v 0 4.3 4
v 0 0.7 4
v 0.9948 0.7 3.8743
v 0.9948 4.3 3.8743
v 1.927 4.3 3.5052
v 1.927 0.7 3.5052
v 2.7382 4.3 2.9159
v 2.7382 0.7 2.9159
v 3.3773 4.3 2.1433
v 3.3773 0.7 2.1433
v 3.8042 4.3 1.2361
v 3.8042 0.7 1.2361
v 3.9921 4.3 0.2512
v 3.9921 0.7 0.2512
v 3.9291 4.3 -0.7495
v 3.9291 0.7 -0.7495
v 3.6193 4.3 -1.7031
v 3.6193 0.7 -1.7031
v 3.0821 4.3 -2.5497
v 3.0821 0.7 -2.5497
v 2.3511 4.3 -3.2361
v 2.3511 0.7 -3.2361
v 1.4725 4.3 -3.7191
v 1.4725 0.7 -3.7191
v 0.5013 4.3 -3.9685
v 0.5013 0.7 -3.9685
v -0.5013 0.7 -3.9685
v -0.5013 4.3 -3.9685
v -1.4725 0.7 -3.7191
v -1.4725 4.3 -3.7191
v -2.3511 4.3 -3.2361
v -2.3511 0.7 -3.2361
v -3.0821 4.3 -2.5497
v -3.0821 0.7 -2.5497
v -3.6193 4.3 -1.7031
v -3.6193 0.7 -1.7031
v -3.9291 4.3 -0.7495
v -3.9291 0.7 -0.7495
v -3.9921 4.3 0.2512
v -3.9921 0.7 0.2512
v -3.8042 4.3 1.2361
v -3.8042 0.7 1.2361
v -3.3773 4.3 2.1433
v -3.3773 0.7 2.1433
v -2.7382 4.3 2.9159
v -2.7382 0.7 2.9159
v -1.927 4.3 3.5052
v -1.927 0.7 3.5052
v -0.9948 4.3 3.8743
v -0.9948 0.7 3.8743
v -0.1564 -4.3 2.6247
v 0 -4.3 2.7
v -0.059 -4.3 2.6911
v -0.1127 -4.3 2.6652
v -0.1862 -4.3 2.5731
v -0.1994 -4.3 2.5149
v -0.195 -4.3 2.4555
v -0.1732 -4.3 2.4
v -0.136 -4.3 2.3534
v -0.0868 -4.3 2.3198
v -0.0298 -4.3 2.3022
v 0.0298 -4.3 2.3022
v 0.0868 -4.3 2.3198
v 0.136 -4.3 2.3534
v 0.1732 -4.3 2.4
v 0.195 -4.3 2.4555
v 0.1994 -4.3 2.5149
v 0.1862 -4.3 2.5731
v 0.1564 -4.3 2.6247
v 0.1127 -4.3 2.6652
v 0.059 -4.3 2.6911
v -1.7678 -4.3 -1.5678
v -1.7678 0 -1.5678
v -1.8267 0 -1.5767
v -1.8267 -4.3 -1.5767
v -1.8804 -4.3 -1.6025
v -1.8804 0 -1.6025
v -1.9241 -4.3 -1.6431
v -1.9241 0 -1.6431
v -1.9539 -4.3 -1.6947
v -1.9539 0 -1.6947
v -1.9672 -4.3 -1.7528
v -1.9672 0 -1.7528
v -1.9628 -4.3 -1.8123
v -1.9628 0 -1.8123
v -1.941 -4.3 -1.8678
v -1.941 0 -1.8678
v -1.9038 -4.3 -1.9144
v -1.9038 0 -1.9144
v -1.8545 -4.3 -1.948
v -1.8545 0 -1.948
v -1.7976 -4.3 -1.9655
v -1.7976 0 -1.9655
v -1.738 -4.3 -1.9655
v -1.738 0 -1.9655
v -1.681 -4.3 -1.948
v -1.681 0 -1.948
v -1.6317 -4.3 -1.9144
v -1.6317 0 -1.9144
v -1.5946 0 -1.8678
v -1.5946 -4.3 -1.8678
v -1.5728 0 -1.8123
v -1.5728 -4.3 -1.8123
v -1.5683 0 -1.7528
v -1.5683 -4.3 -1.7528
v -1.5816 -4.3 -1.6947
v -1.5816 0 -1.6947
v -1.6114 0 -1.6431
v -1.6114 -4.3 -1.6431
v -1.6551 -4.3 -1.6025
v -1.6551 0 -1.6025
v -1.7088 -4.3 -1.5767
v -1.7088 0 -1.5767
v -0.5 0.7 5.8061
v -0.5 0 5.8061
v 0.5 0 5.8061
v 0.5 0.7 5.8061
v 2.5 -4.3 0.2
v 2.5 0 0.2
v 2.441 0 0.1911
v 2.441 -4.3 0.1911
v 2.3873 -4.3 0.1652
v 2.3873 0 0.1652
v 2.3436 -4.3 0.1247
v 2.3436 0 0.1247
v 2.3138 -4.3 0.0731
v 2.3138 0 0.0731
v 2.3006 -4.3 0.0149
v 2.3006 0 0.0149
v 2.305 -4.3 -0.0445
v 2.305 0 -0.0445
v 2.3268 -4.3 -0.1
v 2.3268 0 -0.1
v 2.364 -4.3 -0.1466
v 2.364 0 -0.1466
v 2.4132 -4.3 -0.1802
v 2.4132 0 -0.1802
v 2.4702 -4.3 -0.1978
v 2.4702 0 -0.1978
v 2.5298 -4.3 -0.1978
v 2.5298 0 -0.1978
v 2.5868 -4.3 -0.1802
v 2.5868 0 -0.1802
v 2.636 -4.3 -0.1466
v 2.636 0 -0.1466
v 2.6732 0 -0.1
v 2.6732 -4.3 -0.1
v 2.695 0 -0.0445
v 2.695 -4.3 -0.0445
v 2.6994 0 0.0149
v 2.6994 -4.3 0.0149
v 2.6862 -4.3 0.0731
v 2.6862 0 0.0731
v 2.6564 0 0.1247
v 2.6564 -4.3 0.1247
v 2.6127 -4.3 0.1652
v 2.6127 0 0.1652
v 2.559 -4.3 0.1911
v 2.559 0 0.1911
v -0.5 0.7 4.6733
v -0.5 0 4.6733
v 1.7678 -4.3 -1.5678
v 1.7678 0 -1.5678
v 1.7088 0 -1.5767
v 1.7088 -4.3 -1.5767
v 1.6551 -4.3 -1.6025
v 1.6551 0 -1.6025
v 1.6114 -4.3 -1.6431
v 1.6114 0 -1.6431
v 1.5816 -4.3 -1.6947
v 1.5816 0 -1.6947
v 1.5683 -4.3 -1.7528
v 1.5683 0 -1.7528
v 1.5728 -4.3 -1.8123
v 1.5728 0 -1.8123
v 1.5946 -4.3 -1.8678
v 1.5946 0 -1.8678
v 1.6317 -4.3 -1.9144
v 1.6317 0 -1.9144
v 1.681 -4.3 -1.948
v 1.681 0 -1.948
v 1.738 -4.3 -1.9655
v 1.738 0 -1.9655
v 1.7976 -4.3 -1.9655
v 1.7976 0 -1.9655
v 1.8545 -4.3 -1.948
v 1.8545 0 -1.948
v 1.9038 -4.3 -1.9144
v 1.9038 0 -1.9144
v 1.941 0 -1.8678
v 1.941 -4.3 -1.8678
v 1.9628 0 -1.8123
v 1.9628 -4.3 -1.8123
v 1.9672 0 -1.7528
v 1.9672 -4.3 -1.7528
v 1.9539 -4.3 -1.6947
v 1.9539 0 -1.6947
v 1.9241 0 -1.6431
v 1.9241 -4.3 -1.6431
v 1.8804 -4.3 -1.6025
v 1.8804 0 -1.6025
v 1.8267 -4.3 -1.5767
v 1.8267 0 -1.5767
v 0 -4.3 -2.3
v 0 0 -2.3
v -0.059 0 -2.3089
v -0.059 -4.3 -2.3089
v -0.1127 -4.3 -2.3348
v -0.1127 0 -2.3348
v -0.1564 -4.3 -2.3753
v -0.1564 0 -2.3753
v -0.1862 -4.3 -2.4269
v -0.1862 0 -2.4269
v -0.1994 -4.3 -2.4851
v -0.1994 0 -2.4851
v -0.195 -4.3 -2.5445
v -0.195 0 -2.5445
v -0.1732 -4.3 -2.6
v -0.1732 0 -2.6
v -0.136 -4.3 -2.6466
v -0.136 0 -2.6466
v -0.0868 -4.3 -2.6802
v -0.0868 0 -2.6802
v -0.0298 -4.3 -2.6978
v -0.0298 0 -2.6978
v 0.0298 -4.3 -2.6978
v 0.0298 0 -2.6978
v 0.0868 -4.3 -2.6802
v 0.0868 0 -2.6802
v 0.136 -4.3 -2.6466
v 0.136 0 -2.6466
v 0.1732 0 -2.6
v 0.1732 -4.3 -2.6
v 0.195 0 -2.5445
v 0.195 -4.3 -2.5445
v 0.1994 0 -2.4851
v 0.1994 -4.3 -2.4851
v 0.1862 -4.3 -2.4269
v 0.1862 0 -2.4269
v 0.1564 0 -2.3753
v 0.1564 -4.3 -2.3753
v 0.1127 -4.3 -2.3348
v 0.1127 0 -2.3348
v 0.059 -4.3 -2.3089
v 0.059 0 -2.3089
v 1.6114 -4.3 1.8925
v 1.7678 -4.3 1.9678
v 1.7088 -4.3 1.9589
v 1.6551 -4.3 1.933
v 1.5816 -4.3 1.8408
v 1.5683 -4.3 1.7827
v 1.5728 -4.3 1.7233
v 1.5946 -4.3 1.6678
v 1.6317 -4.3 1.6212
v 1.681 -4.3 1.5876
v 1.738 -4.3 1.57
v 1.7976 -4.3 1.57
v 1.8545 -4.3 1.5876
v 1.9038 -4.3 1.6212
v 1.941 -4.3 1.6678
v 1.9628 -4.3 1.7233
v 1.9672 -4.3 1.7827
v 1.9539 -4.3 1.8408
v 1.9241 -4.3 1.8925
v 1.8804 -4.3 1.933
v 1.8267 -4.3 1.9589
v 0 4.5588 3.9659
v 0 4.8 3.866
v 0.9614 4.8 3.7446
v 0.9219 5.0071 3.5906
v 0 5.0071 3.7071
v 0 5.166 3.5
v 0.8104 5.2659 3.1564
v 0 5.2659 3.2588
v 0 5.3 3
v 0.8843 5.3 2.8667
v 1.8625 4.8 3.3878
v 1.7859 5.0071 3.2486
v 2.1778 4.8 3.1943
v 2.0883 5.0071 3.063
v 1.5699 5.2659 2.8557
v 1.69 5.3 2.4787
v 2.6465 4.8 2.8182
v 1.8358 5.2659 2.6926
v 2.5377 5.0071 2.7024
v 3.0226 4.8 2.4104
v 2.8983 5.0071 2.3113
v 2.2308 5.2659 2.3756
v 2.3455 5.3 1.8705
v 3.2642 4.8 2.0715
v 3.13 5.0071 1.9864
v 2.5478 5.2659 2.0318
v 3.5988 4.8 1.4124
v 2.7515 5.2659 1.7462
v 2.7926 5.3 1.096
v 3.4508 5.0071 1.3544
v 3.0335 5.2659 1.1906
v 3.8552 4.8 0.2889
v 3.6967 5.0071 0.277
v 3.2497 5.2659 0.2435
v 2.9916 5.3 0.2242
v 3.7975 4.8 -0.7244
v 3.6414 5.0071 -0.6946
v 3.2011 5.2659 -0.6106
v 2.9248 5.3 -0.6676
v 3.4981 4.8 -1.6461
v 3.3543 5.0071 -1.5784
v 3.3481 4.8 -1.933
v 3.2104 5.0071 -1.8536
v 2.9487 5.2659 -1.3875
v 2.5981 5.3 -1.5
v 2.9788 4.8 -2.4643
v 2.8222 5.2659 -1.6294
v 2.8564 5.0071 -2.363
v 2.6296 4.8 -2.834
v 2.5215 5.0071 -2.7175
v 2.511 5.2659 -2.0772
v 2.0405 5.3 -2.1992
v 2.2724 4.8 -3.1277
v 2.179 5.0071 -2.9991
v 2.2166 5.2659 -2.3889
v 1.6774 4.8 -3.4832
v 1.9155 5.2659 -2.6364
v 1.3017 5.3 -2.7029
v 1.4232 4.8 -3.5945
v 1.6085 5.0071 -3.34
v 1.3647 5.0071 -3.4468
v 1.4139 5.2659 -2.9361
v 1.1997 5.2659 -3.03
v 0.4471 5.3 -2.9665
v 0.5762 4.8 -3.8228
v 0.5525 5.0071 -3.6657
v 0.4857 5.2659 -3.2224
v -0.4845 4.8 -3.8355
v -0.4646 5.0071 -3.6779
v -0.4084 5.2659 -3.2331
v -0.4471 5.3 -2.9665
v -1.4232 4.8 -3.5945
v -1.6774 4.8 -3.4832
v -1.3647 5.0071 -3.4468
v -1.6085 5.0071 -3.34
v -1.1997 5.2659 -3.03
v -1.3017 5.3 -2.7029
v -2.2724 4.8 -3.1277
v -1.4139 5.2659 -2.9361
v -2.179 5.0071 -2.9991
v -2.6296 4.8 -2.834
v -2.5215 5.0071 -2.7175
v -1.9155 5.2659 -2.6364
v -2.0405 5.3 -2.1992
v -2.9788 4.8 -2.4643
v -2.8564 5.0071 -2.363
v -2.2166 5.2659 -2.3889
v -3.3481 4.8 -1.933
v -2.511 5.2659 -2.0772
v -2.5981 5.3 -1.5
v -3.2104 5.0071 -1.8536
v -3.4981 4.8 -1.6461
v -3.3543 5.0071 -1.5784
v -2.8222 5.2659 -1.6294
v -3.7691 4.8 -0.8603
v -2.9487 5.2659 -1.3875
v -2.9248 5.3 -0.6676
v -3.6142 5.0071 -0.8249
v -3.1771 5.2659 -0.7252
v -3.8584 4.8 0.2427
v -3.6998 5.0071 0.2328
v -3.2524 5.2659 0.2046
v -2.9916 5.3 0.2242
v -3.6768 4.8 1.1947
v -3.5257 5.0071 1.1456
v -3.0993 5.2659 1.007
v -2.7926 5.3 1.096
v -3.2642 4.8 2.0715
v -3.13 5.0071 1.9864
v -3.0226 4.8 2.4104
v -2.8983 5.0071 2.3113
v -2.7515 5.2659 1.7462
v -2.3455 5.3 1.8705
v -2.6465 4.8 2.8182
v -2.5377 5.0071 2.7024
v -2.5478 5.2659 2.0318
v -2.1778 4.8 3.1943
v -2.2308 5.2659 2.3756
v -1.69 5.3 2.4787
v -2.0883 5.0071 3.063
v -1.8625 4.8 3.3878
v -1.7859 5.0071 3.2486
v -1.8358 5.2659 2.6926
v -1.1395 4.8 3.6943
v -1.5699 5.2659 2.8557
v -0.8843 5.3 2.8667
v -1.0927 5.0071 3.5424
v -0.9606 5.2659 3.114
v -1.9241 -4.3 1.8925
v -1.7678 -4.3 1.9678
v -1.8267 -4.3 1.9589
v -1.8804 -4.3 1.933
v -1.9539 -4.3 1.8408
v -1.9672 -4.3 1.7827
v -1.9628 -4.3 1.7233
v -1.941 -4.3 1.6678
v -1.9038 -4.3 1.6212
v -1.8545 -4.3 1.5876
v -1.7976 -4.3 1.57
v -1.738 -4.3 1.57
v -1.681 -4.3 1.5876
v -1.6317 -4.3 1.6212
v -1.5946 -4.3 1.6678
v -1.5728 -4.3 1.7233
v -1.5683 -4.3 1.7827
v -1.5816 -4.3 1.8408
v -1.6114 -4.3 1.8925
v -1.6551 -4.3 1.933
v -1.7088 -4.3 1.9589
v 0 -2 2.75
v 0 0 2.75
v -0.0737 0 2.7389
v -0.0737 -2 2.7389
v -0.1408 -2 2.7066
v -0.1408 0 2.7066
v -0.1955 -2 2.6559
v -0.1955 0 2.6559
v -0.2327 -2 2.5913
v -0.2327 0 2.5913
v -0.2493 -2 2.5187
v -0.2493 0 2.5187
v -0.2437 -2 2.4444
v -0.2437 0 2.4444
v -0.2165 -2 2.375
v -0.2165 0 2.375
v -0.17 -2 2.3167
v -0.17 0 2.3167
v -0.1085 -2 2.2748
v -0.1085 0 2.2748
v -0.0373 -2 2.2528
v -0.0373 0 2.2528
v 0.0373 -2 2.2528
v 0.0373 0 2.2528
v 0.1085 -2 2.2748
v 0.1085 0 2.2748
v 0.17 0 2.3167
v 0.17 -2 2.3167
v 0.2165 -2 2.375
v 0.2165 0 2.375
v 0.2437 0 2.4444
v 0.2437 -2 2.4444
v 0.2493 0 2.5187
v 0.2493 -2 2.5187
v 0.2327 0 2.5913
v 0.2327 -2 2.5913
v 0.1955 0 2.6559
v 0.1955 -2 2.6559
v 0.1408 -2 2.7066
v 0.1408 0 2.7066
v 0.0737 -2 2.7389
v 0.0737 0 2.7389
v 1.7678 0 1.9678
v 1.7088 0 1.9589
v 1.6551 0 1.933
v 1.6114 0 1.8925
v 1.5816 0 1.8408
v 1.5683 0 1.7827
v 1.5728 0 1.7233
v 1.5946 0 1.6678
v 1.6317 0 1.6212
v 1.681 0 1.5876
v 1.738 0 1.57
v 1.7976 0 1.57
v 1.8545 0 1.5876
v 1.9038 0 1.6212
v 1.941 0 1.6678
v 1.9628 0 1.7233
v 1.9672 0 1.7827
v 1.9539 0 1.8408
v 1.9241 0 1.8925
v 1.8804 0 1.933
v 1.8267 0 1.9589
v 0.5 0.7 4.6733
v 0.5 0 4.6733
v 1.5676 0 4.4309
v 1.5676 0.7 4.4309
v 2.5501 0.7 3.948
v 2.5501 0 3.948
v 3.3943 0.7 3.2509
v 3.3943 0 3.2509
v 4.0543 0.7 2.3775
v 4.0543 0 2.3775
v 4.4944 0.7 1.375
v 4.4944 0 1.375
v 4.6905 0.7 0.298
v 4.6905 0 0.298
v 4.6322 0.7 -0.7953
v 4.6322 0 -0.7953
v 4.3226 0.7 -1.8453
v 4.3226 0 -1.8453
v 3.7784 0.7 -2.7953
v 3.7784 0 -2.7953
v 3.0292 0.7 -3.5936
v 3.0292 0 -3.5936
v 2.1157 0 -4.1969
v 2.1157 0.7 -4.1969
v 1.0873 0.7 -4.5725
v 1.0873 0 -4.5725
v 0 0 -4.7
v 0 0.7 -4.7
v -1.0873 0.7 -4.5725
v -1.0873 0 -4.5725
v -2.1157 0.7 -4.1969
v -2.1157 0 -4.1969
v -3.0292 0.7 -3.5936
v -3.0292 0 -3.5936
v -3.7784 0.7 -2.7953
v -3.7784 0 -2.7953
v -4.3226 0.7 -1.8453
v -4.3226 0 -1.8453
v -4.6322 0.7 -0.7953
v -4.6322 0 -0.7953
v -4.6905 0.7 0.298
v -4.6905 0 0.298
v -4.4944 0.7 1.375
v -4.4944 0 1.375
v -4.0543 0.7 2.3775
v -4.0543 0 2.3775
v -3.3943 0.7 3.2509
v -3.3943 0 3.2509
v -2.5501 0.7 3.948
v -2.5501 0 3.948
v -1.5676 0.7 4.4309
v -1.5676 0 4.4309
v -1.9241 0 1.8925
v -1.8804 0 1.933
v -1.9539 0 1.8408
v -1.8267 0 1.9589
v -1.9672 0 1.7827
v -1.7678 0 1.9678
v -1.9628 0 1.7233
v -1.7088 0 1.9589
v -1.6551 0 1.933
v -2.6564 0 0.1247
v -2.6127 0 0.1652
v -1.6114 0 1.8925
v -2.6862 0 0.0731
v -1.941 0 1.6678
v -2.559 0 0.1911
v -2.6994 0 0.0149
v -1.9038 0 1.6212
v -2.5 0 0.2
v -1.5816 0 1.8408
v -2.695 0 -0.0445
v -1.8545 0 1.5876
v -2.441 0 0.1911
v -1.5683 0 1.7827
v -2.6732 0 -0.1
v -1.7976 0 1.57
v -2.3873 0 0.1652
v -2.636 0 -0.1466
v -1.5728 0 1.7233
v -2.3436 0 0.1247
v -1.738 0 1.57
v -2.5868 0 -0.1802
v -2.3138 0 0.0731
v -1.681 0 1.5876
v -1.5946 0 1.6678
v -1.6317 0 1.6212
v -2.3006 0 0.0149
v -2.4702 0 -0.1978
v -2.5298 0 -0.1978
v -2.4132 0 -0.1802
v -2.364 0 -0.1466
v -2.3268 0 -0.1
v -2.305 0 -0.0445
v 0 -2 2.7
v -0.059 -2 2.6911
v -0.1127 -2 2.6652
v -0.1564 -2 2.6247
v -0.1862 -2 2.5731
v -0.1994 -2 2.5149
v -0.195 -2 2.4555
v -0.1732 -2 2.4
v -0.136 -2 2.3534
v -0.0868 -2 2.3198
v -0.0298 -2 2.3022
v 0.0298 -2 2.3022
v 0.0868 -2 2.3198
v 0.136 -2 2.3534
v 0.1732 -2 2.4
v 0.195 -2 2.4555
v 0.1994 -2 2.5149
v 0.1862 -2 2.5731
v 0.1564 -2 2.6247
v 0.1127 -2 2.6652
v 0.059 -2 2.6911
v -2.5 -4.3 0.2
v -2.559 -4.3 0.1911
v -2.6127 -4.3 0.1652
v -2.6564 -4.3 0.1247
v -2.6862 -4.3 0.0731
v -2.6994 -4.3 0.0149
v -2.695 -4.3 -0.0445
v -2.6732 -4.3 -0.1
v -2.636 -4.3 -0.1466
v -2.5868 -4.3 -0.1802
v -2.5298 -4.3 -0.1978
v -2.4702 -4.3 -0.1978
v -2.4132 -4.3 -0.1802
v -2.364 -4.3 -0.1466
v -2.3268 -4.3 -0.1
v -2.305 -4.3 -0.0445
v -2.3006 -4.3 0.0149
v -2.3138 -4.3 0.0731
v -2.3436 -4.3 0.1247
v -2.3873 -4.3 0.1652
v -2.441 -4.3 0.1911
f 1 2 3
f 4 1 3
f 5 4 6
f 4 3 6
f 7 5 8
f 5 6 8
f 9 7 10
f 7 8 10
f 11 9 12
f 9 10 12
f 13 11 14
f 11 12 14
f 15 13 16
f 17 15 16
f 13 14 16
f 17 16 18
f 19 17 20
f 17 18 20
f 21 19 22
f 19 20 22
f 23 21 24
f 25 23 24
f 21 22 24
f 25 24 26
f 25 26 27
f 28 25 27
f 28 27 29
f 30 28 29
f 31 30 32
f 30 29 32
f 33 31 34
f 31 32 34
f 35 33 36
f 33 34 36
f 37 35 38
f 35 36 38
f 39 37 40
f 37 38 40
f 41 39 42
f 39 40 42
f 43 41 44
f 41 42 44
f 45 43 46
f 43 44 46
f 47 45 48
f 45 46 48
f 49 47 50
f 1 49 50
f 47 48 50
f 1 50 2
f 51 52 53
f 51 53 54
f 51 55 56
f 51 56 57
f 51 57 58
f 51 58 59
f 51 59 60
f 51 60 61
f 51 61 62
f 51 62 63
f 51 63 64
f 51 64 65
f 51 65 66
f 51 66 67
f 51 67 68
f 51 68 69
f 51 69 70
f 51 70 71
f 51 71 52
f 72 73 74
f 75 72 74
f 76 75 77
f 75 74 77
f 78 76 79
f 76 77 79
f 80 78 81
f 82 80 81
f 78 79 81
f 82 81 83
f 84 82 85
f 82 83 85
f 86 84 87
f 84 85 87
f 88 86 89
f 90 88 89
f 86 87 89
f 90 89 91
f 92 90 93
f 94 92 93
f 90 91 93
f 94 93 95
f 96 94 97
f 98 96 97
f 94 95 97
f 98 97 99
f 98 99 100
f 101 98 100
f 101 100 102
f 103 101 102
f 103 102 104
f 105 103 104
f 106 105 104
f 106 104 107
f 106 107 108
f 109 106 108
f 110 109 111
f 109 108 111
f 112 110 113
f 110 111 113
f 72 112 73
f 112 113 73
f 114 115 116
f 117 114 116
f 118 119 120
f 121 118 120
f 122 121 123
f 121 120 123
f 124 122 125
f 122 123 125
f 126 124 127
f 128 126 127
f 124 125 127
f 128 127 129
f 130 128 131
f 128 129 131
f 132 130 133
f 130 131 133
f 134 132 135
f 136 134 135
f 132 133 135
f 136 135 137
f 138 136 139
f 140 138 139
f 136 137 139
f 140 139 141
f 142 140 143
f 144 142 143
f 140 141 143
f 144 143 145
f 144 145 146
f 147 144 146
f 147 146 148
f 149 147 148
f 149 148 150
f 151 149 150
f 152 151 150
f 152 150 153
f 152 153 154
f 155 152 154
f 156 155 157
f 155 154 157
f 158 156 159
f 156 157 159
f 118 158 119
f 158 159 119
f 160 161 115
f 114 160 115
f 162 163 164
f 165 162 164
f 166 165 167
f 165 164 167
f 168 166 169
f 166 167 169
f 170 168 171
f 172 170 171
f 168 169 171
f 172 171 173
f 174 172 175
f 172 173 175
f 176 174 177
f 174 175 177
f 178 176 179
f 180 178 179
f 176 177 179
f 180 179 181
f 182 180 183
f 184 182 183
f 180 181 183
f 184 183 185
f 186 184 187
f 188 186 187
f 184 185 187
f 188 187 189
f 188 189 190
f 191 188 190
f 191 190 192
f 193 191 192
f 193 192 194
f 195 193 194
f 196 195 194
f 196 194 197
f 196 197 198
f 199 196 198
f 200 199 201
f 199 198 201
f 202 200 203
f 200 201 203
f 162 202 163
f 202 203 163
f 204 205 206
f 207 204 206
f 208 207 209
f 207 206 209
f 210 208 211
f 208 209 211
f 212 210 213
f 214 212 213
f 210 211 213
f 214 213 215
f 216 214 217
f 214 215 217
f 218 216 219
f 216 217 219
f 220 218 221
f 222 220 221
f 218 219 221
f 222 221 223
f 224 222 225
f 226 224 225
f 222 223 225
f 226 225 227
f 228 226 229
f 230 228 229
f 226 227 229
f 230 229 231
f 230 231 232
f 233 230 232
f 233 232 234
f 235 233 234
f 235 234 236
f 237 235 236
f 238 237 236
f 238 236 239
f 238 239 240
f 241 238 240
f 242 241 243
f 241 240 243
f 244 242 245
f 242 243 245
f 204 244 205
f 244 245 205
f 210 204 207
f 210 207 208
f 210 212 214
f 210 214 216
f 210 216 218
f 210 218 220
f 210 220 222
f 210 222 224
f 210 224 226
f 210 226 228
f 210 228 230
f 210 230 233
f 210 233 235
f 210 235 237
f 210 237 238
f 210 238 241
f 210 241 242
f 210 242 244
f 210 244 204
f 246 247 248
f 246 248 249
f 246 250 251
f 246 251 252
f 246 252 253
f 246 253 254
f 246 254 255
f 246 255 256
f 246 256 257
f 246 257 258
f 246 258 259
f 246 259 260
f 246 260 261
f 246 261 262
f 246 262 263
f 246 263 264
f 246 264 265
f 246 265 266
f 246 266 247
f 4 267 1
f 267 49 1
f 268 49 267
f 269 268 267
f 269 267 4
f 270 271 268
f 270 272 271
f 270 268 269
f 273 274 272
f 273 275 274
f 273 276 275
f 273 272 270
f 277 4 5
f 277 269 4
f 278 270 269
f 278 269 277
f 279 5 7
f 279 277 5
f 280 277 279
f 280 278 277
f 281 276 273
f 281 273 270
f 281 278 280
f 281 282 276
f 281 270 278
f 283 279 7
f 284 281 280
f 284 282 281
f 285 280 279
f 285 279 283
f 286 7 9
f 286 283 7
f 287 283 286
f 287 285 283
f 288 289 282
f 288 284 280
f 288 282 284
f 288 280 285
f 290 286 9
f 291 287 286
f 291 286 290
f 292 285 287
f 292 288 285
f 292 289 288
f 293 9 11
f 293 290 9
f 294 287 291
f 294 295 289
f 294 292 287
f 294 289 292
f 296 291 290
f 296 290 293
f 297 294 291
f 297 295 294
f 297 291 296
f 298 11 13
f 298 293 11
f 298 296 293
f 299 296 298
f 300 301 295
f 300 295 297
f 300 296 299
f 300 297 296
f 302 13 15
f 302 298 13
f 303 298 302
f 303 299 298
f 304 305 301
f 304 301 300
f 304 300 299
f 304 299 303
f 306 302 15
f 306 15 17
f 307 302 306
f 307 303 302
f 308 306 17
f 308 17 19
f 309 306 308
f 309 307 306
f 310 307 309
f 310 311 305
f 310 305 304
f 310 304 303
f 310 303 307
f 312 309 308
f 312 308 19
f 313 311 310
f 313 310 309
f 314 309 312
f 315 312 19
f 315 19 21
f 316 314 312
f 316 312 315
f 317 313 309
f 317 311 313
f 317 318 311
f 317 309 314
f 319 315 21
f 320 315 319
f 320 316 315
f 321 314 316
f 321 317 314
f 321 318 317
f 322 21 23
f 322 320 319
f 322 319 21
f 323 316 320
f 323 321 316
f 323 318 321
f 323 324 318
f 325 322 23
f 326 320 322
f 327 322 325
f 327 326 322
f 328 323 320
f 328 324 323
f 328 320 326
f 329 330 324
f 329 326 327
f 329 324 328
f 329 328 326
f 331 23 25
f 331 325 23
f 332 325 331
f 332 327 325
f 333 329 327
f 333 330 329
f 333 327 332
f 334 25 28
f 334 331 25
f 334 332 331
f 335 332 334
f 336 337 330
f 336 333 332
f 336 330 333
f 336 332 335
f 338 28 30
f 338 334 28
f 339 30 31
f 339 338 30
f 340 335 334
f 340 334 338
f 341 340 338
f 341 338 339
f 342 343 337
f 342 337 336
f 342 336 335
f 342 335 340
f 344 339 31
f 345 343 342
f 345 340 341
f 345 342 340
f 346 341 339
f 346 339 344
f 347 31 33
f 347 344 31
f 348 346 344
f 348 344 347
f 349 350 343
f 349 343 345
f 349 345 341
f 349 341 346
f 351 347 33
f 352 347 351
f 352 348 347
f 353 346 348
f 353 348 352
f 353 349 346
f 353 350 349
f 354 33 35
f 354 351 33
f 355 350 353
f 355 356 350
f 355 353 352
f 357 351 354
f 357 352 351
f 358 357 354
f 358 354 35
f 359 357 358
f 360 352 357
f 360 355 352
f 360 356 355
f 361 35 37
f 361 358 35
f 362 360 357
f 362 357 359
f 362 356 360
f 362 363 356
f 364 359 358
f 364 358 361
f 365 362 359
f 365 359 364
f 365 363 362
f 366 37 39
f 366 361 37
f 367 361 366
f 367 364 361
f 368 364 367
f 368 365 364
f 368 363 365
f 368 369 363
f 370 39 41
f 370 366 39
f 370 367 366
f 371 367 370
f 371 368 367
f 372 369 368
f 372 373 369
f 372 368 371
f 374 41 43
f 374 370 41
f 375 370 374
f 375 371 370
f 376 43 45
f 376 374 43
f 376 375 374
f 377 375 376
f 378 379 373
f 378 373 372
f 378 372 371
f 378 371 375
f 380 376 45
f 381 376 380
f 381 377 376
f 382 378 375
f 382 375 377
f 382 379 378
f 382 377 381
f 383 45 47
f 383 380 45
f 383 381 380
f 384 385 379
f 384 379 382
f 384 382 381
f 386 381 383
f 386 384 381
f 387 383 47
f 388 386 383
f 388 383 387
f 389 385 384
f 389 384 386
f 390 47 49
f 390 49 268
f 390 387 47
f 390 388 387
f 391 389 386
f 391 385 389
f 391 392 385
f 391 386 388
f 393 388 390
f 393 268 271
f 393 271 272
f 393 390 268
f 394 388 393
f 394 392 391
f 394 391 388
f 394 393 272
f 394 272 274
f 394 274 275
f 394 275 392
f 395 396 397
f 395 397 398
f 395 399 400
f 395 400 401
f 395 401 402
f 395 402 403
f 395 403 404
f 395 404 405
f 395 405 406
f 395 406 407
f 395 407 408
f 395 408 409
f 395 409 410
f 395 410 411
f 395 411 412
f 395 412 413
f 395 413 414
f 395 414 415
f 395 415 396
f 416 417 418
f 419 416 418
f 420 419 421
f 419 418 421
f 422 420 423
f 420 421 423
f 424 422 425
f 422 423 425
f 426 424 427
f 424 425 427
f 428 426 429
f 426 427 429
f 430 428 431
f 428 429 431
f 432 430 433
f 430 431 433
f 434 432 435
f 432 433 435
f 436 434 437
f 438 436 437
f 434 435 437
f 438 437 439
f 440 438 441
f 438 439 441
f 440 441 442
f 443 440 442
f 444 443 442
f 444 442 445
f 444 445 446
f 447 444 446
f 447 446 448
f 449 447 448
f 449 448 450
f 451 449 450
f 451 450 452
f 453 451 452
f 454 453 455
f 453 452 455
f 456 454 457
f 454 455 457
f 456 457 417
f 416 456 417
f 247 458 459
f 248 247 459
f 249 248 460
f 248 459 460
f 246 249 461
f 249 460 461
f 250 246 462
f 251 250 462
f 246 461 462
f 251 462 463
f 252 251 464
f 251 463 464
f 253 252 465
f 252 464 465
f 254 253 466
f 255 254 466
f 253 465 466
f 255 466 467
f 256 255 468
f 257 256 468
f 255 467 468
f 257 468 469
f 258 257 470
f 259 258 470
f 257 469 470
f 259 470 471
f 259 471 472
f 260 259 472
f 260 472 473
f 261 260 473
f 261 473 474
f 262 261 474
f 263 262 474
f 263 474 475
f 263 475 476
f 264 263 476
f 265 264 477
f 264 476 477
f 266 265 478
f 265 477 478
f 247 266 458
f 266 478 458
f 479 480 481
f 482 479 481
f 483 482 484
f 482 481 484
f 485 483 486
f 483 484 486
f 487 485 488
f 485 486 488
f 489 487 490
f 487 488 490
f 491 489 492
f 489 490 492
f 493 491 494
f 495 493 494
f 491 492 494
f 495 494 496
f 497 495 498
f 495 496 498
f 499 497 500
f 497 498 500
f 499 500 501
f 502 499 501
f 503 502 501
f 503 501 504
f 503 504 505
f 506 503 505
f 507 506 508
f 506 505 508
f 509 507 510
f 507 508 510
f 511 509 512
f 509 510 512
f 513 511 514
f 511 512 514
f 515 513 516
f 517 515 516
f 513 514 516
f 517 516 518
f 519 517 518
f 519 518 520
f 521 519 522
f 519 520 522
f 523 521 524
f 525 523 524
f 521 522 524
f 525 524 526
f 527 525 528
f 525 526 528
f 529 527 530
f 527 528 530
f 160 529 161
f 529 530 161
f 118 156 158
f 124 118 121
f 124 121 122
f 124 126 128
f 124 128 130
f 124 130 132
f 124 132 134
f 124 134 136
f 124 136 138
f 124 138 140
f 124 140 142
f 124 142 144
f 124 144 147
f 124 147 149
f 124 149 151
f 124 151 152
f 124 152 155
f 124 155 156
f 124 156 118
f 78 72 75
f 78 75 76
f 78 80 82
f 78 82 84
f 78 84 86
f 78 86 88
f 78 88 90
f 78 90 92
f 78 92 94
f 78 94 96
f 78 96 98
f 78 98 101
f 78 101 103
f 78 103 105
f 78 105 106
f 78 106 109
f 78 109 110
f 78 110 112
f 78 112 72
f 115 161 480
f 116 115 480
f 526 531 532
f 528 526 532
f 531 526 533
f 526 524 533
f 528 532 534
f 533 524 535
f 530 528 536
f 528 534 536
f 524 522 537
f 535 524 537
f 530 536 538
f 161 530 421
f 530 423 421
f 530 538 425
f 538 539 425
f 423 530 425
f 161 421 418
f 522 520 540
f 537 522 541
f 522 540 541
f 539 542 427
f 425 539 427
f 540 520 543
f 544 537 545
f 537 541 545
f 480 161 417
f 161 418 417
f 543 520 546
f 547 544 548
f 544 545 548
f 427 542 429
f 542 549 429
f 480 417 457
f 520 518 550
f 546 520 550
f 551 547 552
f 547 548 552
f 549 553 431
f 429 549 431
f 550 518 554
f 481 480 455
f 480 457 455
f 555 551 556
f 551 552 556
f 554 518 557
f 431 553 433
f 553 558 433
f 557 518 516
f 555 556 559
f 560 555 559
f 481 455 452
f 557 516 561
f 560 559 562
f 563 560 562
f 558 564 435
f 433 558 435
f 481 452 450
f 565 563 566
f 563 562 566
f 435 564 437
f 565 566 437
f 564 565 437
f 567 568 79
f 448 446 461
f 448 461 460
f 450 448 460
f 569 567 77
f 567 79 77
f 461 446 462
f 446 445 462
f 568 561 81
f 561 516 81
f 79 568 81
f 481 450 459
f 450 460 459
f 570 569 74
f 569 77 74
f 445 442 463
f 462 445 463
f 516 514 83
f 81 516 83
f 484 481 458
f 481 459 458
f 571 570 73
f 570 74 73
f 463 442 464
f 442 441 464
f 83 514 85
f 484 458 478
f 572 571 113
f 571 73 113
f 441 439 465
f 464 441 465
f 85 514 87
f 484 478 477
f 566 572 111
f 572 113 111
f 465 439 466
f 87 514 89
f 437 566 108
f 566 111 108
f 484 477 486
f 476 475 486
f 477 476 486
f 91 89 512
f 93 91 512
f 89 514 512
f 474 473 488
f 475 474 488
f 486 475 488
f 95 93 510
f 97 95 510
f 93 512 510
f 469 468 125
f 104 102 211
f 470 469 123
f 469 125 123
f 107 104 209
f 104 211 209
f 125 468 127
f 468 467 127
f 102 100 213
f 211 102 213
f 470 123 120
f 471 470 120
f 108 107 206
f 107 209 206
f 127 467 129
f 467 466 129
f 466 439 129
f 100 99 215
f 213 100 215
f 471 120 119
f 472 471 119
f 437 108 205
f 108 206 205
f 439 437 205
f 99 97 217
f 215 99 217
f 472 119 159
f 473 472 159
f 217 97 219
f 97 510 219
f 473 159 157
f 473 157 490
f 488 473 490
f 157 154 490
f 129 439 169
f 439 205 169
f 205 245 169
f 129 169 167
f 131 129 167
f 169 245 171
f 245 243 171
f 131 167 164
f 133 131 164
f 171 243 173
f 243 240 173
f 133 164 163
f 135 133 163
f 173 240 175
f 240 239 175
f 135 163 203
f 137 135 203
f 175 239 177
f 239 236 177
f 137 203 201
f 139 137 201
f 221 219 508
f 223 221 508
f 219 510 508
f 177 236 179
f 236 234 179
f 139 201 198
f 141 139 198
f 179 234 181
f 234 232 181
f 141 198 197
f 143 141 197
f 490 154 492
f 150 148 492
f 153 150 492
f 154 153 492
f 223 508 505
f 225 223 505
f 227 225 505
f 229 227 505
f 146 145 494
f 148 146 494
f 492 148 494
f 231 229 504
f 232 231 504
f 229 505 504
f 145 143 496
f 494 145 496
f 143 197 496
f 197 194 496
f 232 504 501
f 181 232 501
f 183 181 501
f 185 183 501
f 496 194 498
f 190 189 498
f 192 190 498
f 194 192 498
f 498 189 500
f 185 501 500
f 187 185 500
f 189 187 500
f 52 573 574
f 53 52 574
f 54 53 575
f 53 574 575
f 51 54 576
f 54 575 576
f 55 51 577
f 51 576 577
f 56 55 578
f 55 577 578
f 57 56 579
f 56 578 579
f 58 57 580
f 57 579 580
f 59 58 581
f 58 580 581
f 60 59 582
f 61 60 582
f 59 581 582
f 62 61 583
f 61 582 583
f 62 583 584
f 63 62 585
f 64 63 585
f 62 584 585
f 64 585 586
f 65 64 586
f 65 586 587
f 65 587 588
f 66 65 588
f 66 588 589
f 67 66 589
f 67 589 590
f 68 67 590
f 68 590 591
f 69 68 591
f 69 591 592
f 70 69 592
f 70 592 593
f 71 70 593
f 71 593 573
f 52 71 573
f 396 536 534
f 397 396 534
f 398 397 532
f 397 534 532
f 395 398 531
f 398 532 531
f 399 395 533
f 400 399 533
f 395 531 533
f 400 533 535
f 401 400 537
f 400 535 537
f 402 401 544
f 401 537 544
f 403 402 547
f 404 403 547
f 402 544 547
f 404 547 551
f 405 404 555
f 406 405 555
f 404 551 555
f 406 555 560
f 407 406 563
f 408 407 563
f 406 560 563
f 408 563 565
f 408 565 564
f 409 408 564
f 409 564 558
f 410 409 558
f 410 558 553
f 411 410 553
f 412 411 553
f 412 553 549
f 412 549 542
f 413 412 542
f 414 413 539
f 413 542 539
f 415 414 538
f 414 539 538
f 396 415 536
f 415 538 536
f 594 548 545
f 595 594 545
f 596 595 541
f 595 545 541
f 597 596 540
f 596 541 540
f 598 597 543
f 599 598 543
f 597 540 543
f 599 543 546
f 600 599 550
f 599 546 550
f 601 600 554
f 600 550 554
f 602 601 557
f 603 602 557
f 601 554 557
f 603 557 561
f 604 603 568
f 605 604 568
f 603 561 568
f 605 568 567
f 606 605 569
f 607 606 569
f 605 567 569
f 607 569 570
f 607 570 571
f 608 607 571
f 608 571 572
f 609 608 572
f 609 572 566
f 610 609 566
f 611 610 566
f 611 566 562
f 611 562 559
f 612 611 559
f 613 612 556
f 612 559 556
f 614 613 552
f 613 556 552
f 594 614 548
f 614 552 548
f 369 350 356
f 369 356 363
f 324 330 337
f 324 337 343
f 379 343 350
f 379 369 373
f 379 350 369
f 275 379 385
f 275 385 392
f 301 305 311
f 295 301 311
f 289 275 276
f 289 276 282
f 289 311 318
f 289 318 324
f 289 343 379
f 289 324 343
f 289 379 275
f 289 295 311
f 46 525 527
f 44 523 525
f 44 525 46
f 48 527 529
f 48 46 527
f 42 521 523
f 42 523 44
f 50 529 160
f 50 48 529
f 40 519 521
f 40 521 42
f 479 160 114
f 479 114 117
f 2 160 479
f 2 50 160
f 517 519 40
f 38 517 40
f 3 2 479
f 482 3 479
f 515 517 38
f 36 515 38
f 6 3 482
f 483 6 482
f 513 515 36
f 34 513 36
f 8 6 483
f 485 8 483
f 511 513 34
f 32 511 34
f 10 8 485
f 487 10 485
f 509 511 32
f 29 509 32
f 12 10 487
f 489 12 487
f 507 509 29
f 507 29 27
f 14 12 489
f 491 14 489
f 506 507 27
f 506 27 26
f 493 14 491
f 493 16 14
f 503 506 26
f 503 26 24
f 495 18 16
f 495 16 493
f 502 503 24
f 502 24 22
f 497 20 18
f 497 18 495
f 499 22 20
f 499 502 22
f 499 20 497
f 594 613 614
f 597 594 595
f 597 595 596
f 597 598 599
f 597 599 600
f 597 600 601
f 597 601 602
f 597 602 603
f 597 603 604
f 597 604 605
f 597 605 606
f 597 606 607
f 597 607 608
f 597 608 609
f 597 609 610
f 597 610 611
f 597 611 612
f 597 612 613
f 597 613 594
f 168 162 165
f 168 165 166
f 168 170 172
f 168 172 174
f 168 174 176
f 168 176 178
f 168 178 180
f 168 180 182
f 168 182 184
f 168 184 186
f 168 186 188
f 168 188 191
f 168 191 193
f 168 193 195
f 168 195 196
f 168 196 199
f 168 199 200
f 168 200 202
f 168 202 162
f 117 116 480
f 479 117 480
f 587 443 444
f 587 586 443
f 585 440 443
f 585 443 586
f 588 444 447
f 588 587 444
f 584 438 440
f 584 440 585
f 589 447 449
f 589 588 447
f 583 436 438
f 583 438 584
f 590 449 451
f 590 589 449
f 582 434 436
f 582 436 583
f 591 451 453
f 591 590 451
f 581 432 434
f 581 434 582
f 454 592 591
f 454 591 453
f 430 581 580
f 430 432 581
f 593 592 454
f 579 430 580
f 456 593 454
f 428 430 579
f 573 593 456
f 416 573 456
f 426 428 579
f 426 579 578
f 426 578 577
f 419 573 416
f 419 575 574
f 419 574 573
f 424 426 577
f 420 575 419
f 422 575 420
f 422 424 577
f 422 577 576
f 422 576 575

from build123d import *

# Parameters (mm, degrees)
EXTRUDE_1_DEPTH = 0.7
SKETCH_2_R      = 4
EXTRUDE_2_DEPTH = 4.6
FILLET_1_R      = 1
SKETCH_4_R      = 0.2
EXTRUDE_3_DEPTH = 4.3
SKETCH_5_R      = 0.25
EXTRUDE_4_DEPTH = 2


with BuildPart() as part:
    # Эскиз1 → Бобышка-Вытянуть1 (new body)
    with BuildSketch(Plane(origin=(0, 0, 0), x_dir=(1, 0, 0), z_dir=(0, 1, 0))):
        with BuildLine():
            Line((0, -5.806112013), (0.5, -5.806112013))
            Line((0.5, -5.806112013), (0.5, -4.673328578))
            ThreePointArc((0.5, -4.673328578), (0, 4.7), (-0.5, -4.673328578))
            Line((-0.5, -4.673328578), (-0.5, -5.806112013))
            Line((-0.5, -5.806112013), (0, -5.806112013))
        make_face()
    extrude(amount=EXTRUDE_1_DEPTH)

    # Эскиз2 → Бобышка-Вытянуть2 (add)
    with BuildSketch(Plane(origin=(0, 0.7, 0), x_dir=(1, 0, 0), z_dir=(0, 1, 0))):
        with Locations(Location((0, 0, 0), (0, 0, 270))):
            Circle(SKETCH_2_R)
    extrude(amount=EXTRUDE_2_DEPTH)

    # Скругление1
    fillet_1_edges = [part.edges().sort_by_distance(p)[0] for p in [
        (0, 5.3, -4),
    ]]
    fillet(fillet_1_edges, radius=FILLET_1_R)

    # Эскиз4 → Бобышка-Вытянуть3 (add)
    with BuildSketch(Plane.XZ):
        with Locations(Location((2.5, 0, 0), (0, 0, 90))):
            Circle(SKETCH_4_R)
        with Locations(Location((1.767766953, -1.767766953, 0), (0, 0, 90))):
            Circle(SKETCH_4_R)
        with Locations(Location((0, -2.5, 0), (0, 0, 90))):
            Circle(SKETCH_4_R)
        with Locations(Location((-1.767766953, -1.767766953, 0), (0, 0, 90))):
            Circle(SKETCH_4_R)
        with Locations(Location((-2.5, 0, 0), (0, 0, 90))):
            Circle(SKETCH_4_R)
        with Locations(Location((-1.767766953, 1.767766953, 0), (0, 0, 90))):
            Circle(SKETCH_4_R)
        with Locations(Location((0, 2.5, 0), (0, 0, 90))):
            Circle(SKETCH_4_R)
        with Locations(Location((1.767766953, 1.767766953, 0), (0, 0, 90))):
            Circle(SKETCH_4_R)
    extrude(amount=EXTRUDE_3_DEPTH)

    # Эскиз5 → Бобышка-Вытянуть4 (add)
    with BuildSketch(Plane.XZ):
        with Locations(Location((0, 2.5, 0), (0, 0, 90))):
            Circle(SKETCH_5_R)
    extrude(amount=EXTRUDE_4_DEPTH)


solid = part.part
